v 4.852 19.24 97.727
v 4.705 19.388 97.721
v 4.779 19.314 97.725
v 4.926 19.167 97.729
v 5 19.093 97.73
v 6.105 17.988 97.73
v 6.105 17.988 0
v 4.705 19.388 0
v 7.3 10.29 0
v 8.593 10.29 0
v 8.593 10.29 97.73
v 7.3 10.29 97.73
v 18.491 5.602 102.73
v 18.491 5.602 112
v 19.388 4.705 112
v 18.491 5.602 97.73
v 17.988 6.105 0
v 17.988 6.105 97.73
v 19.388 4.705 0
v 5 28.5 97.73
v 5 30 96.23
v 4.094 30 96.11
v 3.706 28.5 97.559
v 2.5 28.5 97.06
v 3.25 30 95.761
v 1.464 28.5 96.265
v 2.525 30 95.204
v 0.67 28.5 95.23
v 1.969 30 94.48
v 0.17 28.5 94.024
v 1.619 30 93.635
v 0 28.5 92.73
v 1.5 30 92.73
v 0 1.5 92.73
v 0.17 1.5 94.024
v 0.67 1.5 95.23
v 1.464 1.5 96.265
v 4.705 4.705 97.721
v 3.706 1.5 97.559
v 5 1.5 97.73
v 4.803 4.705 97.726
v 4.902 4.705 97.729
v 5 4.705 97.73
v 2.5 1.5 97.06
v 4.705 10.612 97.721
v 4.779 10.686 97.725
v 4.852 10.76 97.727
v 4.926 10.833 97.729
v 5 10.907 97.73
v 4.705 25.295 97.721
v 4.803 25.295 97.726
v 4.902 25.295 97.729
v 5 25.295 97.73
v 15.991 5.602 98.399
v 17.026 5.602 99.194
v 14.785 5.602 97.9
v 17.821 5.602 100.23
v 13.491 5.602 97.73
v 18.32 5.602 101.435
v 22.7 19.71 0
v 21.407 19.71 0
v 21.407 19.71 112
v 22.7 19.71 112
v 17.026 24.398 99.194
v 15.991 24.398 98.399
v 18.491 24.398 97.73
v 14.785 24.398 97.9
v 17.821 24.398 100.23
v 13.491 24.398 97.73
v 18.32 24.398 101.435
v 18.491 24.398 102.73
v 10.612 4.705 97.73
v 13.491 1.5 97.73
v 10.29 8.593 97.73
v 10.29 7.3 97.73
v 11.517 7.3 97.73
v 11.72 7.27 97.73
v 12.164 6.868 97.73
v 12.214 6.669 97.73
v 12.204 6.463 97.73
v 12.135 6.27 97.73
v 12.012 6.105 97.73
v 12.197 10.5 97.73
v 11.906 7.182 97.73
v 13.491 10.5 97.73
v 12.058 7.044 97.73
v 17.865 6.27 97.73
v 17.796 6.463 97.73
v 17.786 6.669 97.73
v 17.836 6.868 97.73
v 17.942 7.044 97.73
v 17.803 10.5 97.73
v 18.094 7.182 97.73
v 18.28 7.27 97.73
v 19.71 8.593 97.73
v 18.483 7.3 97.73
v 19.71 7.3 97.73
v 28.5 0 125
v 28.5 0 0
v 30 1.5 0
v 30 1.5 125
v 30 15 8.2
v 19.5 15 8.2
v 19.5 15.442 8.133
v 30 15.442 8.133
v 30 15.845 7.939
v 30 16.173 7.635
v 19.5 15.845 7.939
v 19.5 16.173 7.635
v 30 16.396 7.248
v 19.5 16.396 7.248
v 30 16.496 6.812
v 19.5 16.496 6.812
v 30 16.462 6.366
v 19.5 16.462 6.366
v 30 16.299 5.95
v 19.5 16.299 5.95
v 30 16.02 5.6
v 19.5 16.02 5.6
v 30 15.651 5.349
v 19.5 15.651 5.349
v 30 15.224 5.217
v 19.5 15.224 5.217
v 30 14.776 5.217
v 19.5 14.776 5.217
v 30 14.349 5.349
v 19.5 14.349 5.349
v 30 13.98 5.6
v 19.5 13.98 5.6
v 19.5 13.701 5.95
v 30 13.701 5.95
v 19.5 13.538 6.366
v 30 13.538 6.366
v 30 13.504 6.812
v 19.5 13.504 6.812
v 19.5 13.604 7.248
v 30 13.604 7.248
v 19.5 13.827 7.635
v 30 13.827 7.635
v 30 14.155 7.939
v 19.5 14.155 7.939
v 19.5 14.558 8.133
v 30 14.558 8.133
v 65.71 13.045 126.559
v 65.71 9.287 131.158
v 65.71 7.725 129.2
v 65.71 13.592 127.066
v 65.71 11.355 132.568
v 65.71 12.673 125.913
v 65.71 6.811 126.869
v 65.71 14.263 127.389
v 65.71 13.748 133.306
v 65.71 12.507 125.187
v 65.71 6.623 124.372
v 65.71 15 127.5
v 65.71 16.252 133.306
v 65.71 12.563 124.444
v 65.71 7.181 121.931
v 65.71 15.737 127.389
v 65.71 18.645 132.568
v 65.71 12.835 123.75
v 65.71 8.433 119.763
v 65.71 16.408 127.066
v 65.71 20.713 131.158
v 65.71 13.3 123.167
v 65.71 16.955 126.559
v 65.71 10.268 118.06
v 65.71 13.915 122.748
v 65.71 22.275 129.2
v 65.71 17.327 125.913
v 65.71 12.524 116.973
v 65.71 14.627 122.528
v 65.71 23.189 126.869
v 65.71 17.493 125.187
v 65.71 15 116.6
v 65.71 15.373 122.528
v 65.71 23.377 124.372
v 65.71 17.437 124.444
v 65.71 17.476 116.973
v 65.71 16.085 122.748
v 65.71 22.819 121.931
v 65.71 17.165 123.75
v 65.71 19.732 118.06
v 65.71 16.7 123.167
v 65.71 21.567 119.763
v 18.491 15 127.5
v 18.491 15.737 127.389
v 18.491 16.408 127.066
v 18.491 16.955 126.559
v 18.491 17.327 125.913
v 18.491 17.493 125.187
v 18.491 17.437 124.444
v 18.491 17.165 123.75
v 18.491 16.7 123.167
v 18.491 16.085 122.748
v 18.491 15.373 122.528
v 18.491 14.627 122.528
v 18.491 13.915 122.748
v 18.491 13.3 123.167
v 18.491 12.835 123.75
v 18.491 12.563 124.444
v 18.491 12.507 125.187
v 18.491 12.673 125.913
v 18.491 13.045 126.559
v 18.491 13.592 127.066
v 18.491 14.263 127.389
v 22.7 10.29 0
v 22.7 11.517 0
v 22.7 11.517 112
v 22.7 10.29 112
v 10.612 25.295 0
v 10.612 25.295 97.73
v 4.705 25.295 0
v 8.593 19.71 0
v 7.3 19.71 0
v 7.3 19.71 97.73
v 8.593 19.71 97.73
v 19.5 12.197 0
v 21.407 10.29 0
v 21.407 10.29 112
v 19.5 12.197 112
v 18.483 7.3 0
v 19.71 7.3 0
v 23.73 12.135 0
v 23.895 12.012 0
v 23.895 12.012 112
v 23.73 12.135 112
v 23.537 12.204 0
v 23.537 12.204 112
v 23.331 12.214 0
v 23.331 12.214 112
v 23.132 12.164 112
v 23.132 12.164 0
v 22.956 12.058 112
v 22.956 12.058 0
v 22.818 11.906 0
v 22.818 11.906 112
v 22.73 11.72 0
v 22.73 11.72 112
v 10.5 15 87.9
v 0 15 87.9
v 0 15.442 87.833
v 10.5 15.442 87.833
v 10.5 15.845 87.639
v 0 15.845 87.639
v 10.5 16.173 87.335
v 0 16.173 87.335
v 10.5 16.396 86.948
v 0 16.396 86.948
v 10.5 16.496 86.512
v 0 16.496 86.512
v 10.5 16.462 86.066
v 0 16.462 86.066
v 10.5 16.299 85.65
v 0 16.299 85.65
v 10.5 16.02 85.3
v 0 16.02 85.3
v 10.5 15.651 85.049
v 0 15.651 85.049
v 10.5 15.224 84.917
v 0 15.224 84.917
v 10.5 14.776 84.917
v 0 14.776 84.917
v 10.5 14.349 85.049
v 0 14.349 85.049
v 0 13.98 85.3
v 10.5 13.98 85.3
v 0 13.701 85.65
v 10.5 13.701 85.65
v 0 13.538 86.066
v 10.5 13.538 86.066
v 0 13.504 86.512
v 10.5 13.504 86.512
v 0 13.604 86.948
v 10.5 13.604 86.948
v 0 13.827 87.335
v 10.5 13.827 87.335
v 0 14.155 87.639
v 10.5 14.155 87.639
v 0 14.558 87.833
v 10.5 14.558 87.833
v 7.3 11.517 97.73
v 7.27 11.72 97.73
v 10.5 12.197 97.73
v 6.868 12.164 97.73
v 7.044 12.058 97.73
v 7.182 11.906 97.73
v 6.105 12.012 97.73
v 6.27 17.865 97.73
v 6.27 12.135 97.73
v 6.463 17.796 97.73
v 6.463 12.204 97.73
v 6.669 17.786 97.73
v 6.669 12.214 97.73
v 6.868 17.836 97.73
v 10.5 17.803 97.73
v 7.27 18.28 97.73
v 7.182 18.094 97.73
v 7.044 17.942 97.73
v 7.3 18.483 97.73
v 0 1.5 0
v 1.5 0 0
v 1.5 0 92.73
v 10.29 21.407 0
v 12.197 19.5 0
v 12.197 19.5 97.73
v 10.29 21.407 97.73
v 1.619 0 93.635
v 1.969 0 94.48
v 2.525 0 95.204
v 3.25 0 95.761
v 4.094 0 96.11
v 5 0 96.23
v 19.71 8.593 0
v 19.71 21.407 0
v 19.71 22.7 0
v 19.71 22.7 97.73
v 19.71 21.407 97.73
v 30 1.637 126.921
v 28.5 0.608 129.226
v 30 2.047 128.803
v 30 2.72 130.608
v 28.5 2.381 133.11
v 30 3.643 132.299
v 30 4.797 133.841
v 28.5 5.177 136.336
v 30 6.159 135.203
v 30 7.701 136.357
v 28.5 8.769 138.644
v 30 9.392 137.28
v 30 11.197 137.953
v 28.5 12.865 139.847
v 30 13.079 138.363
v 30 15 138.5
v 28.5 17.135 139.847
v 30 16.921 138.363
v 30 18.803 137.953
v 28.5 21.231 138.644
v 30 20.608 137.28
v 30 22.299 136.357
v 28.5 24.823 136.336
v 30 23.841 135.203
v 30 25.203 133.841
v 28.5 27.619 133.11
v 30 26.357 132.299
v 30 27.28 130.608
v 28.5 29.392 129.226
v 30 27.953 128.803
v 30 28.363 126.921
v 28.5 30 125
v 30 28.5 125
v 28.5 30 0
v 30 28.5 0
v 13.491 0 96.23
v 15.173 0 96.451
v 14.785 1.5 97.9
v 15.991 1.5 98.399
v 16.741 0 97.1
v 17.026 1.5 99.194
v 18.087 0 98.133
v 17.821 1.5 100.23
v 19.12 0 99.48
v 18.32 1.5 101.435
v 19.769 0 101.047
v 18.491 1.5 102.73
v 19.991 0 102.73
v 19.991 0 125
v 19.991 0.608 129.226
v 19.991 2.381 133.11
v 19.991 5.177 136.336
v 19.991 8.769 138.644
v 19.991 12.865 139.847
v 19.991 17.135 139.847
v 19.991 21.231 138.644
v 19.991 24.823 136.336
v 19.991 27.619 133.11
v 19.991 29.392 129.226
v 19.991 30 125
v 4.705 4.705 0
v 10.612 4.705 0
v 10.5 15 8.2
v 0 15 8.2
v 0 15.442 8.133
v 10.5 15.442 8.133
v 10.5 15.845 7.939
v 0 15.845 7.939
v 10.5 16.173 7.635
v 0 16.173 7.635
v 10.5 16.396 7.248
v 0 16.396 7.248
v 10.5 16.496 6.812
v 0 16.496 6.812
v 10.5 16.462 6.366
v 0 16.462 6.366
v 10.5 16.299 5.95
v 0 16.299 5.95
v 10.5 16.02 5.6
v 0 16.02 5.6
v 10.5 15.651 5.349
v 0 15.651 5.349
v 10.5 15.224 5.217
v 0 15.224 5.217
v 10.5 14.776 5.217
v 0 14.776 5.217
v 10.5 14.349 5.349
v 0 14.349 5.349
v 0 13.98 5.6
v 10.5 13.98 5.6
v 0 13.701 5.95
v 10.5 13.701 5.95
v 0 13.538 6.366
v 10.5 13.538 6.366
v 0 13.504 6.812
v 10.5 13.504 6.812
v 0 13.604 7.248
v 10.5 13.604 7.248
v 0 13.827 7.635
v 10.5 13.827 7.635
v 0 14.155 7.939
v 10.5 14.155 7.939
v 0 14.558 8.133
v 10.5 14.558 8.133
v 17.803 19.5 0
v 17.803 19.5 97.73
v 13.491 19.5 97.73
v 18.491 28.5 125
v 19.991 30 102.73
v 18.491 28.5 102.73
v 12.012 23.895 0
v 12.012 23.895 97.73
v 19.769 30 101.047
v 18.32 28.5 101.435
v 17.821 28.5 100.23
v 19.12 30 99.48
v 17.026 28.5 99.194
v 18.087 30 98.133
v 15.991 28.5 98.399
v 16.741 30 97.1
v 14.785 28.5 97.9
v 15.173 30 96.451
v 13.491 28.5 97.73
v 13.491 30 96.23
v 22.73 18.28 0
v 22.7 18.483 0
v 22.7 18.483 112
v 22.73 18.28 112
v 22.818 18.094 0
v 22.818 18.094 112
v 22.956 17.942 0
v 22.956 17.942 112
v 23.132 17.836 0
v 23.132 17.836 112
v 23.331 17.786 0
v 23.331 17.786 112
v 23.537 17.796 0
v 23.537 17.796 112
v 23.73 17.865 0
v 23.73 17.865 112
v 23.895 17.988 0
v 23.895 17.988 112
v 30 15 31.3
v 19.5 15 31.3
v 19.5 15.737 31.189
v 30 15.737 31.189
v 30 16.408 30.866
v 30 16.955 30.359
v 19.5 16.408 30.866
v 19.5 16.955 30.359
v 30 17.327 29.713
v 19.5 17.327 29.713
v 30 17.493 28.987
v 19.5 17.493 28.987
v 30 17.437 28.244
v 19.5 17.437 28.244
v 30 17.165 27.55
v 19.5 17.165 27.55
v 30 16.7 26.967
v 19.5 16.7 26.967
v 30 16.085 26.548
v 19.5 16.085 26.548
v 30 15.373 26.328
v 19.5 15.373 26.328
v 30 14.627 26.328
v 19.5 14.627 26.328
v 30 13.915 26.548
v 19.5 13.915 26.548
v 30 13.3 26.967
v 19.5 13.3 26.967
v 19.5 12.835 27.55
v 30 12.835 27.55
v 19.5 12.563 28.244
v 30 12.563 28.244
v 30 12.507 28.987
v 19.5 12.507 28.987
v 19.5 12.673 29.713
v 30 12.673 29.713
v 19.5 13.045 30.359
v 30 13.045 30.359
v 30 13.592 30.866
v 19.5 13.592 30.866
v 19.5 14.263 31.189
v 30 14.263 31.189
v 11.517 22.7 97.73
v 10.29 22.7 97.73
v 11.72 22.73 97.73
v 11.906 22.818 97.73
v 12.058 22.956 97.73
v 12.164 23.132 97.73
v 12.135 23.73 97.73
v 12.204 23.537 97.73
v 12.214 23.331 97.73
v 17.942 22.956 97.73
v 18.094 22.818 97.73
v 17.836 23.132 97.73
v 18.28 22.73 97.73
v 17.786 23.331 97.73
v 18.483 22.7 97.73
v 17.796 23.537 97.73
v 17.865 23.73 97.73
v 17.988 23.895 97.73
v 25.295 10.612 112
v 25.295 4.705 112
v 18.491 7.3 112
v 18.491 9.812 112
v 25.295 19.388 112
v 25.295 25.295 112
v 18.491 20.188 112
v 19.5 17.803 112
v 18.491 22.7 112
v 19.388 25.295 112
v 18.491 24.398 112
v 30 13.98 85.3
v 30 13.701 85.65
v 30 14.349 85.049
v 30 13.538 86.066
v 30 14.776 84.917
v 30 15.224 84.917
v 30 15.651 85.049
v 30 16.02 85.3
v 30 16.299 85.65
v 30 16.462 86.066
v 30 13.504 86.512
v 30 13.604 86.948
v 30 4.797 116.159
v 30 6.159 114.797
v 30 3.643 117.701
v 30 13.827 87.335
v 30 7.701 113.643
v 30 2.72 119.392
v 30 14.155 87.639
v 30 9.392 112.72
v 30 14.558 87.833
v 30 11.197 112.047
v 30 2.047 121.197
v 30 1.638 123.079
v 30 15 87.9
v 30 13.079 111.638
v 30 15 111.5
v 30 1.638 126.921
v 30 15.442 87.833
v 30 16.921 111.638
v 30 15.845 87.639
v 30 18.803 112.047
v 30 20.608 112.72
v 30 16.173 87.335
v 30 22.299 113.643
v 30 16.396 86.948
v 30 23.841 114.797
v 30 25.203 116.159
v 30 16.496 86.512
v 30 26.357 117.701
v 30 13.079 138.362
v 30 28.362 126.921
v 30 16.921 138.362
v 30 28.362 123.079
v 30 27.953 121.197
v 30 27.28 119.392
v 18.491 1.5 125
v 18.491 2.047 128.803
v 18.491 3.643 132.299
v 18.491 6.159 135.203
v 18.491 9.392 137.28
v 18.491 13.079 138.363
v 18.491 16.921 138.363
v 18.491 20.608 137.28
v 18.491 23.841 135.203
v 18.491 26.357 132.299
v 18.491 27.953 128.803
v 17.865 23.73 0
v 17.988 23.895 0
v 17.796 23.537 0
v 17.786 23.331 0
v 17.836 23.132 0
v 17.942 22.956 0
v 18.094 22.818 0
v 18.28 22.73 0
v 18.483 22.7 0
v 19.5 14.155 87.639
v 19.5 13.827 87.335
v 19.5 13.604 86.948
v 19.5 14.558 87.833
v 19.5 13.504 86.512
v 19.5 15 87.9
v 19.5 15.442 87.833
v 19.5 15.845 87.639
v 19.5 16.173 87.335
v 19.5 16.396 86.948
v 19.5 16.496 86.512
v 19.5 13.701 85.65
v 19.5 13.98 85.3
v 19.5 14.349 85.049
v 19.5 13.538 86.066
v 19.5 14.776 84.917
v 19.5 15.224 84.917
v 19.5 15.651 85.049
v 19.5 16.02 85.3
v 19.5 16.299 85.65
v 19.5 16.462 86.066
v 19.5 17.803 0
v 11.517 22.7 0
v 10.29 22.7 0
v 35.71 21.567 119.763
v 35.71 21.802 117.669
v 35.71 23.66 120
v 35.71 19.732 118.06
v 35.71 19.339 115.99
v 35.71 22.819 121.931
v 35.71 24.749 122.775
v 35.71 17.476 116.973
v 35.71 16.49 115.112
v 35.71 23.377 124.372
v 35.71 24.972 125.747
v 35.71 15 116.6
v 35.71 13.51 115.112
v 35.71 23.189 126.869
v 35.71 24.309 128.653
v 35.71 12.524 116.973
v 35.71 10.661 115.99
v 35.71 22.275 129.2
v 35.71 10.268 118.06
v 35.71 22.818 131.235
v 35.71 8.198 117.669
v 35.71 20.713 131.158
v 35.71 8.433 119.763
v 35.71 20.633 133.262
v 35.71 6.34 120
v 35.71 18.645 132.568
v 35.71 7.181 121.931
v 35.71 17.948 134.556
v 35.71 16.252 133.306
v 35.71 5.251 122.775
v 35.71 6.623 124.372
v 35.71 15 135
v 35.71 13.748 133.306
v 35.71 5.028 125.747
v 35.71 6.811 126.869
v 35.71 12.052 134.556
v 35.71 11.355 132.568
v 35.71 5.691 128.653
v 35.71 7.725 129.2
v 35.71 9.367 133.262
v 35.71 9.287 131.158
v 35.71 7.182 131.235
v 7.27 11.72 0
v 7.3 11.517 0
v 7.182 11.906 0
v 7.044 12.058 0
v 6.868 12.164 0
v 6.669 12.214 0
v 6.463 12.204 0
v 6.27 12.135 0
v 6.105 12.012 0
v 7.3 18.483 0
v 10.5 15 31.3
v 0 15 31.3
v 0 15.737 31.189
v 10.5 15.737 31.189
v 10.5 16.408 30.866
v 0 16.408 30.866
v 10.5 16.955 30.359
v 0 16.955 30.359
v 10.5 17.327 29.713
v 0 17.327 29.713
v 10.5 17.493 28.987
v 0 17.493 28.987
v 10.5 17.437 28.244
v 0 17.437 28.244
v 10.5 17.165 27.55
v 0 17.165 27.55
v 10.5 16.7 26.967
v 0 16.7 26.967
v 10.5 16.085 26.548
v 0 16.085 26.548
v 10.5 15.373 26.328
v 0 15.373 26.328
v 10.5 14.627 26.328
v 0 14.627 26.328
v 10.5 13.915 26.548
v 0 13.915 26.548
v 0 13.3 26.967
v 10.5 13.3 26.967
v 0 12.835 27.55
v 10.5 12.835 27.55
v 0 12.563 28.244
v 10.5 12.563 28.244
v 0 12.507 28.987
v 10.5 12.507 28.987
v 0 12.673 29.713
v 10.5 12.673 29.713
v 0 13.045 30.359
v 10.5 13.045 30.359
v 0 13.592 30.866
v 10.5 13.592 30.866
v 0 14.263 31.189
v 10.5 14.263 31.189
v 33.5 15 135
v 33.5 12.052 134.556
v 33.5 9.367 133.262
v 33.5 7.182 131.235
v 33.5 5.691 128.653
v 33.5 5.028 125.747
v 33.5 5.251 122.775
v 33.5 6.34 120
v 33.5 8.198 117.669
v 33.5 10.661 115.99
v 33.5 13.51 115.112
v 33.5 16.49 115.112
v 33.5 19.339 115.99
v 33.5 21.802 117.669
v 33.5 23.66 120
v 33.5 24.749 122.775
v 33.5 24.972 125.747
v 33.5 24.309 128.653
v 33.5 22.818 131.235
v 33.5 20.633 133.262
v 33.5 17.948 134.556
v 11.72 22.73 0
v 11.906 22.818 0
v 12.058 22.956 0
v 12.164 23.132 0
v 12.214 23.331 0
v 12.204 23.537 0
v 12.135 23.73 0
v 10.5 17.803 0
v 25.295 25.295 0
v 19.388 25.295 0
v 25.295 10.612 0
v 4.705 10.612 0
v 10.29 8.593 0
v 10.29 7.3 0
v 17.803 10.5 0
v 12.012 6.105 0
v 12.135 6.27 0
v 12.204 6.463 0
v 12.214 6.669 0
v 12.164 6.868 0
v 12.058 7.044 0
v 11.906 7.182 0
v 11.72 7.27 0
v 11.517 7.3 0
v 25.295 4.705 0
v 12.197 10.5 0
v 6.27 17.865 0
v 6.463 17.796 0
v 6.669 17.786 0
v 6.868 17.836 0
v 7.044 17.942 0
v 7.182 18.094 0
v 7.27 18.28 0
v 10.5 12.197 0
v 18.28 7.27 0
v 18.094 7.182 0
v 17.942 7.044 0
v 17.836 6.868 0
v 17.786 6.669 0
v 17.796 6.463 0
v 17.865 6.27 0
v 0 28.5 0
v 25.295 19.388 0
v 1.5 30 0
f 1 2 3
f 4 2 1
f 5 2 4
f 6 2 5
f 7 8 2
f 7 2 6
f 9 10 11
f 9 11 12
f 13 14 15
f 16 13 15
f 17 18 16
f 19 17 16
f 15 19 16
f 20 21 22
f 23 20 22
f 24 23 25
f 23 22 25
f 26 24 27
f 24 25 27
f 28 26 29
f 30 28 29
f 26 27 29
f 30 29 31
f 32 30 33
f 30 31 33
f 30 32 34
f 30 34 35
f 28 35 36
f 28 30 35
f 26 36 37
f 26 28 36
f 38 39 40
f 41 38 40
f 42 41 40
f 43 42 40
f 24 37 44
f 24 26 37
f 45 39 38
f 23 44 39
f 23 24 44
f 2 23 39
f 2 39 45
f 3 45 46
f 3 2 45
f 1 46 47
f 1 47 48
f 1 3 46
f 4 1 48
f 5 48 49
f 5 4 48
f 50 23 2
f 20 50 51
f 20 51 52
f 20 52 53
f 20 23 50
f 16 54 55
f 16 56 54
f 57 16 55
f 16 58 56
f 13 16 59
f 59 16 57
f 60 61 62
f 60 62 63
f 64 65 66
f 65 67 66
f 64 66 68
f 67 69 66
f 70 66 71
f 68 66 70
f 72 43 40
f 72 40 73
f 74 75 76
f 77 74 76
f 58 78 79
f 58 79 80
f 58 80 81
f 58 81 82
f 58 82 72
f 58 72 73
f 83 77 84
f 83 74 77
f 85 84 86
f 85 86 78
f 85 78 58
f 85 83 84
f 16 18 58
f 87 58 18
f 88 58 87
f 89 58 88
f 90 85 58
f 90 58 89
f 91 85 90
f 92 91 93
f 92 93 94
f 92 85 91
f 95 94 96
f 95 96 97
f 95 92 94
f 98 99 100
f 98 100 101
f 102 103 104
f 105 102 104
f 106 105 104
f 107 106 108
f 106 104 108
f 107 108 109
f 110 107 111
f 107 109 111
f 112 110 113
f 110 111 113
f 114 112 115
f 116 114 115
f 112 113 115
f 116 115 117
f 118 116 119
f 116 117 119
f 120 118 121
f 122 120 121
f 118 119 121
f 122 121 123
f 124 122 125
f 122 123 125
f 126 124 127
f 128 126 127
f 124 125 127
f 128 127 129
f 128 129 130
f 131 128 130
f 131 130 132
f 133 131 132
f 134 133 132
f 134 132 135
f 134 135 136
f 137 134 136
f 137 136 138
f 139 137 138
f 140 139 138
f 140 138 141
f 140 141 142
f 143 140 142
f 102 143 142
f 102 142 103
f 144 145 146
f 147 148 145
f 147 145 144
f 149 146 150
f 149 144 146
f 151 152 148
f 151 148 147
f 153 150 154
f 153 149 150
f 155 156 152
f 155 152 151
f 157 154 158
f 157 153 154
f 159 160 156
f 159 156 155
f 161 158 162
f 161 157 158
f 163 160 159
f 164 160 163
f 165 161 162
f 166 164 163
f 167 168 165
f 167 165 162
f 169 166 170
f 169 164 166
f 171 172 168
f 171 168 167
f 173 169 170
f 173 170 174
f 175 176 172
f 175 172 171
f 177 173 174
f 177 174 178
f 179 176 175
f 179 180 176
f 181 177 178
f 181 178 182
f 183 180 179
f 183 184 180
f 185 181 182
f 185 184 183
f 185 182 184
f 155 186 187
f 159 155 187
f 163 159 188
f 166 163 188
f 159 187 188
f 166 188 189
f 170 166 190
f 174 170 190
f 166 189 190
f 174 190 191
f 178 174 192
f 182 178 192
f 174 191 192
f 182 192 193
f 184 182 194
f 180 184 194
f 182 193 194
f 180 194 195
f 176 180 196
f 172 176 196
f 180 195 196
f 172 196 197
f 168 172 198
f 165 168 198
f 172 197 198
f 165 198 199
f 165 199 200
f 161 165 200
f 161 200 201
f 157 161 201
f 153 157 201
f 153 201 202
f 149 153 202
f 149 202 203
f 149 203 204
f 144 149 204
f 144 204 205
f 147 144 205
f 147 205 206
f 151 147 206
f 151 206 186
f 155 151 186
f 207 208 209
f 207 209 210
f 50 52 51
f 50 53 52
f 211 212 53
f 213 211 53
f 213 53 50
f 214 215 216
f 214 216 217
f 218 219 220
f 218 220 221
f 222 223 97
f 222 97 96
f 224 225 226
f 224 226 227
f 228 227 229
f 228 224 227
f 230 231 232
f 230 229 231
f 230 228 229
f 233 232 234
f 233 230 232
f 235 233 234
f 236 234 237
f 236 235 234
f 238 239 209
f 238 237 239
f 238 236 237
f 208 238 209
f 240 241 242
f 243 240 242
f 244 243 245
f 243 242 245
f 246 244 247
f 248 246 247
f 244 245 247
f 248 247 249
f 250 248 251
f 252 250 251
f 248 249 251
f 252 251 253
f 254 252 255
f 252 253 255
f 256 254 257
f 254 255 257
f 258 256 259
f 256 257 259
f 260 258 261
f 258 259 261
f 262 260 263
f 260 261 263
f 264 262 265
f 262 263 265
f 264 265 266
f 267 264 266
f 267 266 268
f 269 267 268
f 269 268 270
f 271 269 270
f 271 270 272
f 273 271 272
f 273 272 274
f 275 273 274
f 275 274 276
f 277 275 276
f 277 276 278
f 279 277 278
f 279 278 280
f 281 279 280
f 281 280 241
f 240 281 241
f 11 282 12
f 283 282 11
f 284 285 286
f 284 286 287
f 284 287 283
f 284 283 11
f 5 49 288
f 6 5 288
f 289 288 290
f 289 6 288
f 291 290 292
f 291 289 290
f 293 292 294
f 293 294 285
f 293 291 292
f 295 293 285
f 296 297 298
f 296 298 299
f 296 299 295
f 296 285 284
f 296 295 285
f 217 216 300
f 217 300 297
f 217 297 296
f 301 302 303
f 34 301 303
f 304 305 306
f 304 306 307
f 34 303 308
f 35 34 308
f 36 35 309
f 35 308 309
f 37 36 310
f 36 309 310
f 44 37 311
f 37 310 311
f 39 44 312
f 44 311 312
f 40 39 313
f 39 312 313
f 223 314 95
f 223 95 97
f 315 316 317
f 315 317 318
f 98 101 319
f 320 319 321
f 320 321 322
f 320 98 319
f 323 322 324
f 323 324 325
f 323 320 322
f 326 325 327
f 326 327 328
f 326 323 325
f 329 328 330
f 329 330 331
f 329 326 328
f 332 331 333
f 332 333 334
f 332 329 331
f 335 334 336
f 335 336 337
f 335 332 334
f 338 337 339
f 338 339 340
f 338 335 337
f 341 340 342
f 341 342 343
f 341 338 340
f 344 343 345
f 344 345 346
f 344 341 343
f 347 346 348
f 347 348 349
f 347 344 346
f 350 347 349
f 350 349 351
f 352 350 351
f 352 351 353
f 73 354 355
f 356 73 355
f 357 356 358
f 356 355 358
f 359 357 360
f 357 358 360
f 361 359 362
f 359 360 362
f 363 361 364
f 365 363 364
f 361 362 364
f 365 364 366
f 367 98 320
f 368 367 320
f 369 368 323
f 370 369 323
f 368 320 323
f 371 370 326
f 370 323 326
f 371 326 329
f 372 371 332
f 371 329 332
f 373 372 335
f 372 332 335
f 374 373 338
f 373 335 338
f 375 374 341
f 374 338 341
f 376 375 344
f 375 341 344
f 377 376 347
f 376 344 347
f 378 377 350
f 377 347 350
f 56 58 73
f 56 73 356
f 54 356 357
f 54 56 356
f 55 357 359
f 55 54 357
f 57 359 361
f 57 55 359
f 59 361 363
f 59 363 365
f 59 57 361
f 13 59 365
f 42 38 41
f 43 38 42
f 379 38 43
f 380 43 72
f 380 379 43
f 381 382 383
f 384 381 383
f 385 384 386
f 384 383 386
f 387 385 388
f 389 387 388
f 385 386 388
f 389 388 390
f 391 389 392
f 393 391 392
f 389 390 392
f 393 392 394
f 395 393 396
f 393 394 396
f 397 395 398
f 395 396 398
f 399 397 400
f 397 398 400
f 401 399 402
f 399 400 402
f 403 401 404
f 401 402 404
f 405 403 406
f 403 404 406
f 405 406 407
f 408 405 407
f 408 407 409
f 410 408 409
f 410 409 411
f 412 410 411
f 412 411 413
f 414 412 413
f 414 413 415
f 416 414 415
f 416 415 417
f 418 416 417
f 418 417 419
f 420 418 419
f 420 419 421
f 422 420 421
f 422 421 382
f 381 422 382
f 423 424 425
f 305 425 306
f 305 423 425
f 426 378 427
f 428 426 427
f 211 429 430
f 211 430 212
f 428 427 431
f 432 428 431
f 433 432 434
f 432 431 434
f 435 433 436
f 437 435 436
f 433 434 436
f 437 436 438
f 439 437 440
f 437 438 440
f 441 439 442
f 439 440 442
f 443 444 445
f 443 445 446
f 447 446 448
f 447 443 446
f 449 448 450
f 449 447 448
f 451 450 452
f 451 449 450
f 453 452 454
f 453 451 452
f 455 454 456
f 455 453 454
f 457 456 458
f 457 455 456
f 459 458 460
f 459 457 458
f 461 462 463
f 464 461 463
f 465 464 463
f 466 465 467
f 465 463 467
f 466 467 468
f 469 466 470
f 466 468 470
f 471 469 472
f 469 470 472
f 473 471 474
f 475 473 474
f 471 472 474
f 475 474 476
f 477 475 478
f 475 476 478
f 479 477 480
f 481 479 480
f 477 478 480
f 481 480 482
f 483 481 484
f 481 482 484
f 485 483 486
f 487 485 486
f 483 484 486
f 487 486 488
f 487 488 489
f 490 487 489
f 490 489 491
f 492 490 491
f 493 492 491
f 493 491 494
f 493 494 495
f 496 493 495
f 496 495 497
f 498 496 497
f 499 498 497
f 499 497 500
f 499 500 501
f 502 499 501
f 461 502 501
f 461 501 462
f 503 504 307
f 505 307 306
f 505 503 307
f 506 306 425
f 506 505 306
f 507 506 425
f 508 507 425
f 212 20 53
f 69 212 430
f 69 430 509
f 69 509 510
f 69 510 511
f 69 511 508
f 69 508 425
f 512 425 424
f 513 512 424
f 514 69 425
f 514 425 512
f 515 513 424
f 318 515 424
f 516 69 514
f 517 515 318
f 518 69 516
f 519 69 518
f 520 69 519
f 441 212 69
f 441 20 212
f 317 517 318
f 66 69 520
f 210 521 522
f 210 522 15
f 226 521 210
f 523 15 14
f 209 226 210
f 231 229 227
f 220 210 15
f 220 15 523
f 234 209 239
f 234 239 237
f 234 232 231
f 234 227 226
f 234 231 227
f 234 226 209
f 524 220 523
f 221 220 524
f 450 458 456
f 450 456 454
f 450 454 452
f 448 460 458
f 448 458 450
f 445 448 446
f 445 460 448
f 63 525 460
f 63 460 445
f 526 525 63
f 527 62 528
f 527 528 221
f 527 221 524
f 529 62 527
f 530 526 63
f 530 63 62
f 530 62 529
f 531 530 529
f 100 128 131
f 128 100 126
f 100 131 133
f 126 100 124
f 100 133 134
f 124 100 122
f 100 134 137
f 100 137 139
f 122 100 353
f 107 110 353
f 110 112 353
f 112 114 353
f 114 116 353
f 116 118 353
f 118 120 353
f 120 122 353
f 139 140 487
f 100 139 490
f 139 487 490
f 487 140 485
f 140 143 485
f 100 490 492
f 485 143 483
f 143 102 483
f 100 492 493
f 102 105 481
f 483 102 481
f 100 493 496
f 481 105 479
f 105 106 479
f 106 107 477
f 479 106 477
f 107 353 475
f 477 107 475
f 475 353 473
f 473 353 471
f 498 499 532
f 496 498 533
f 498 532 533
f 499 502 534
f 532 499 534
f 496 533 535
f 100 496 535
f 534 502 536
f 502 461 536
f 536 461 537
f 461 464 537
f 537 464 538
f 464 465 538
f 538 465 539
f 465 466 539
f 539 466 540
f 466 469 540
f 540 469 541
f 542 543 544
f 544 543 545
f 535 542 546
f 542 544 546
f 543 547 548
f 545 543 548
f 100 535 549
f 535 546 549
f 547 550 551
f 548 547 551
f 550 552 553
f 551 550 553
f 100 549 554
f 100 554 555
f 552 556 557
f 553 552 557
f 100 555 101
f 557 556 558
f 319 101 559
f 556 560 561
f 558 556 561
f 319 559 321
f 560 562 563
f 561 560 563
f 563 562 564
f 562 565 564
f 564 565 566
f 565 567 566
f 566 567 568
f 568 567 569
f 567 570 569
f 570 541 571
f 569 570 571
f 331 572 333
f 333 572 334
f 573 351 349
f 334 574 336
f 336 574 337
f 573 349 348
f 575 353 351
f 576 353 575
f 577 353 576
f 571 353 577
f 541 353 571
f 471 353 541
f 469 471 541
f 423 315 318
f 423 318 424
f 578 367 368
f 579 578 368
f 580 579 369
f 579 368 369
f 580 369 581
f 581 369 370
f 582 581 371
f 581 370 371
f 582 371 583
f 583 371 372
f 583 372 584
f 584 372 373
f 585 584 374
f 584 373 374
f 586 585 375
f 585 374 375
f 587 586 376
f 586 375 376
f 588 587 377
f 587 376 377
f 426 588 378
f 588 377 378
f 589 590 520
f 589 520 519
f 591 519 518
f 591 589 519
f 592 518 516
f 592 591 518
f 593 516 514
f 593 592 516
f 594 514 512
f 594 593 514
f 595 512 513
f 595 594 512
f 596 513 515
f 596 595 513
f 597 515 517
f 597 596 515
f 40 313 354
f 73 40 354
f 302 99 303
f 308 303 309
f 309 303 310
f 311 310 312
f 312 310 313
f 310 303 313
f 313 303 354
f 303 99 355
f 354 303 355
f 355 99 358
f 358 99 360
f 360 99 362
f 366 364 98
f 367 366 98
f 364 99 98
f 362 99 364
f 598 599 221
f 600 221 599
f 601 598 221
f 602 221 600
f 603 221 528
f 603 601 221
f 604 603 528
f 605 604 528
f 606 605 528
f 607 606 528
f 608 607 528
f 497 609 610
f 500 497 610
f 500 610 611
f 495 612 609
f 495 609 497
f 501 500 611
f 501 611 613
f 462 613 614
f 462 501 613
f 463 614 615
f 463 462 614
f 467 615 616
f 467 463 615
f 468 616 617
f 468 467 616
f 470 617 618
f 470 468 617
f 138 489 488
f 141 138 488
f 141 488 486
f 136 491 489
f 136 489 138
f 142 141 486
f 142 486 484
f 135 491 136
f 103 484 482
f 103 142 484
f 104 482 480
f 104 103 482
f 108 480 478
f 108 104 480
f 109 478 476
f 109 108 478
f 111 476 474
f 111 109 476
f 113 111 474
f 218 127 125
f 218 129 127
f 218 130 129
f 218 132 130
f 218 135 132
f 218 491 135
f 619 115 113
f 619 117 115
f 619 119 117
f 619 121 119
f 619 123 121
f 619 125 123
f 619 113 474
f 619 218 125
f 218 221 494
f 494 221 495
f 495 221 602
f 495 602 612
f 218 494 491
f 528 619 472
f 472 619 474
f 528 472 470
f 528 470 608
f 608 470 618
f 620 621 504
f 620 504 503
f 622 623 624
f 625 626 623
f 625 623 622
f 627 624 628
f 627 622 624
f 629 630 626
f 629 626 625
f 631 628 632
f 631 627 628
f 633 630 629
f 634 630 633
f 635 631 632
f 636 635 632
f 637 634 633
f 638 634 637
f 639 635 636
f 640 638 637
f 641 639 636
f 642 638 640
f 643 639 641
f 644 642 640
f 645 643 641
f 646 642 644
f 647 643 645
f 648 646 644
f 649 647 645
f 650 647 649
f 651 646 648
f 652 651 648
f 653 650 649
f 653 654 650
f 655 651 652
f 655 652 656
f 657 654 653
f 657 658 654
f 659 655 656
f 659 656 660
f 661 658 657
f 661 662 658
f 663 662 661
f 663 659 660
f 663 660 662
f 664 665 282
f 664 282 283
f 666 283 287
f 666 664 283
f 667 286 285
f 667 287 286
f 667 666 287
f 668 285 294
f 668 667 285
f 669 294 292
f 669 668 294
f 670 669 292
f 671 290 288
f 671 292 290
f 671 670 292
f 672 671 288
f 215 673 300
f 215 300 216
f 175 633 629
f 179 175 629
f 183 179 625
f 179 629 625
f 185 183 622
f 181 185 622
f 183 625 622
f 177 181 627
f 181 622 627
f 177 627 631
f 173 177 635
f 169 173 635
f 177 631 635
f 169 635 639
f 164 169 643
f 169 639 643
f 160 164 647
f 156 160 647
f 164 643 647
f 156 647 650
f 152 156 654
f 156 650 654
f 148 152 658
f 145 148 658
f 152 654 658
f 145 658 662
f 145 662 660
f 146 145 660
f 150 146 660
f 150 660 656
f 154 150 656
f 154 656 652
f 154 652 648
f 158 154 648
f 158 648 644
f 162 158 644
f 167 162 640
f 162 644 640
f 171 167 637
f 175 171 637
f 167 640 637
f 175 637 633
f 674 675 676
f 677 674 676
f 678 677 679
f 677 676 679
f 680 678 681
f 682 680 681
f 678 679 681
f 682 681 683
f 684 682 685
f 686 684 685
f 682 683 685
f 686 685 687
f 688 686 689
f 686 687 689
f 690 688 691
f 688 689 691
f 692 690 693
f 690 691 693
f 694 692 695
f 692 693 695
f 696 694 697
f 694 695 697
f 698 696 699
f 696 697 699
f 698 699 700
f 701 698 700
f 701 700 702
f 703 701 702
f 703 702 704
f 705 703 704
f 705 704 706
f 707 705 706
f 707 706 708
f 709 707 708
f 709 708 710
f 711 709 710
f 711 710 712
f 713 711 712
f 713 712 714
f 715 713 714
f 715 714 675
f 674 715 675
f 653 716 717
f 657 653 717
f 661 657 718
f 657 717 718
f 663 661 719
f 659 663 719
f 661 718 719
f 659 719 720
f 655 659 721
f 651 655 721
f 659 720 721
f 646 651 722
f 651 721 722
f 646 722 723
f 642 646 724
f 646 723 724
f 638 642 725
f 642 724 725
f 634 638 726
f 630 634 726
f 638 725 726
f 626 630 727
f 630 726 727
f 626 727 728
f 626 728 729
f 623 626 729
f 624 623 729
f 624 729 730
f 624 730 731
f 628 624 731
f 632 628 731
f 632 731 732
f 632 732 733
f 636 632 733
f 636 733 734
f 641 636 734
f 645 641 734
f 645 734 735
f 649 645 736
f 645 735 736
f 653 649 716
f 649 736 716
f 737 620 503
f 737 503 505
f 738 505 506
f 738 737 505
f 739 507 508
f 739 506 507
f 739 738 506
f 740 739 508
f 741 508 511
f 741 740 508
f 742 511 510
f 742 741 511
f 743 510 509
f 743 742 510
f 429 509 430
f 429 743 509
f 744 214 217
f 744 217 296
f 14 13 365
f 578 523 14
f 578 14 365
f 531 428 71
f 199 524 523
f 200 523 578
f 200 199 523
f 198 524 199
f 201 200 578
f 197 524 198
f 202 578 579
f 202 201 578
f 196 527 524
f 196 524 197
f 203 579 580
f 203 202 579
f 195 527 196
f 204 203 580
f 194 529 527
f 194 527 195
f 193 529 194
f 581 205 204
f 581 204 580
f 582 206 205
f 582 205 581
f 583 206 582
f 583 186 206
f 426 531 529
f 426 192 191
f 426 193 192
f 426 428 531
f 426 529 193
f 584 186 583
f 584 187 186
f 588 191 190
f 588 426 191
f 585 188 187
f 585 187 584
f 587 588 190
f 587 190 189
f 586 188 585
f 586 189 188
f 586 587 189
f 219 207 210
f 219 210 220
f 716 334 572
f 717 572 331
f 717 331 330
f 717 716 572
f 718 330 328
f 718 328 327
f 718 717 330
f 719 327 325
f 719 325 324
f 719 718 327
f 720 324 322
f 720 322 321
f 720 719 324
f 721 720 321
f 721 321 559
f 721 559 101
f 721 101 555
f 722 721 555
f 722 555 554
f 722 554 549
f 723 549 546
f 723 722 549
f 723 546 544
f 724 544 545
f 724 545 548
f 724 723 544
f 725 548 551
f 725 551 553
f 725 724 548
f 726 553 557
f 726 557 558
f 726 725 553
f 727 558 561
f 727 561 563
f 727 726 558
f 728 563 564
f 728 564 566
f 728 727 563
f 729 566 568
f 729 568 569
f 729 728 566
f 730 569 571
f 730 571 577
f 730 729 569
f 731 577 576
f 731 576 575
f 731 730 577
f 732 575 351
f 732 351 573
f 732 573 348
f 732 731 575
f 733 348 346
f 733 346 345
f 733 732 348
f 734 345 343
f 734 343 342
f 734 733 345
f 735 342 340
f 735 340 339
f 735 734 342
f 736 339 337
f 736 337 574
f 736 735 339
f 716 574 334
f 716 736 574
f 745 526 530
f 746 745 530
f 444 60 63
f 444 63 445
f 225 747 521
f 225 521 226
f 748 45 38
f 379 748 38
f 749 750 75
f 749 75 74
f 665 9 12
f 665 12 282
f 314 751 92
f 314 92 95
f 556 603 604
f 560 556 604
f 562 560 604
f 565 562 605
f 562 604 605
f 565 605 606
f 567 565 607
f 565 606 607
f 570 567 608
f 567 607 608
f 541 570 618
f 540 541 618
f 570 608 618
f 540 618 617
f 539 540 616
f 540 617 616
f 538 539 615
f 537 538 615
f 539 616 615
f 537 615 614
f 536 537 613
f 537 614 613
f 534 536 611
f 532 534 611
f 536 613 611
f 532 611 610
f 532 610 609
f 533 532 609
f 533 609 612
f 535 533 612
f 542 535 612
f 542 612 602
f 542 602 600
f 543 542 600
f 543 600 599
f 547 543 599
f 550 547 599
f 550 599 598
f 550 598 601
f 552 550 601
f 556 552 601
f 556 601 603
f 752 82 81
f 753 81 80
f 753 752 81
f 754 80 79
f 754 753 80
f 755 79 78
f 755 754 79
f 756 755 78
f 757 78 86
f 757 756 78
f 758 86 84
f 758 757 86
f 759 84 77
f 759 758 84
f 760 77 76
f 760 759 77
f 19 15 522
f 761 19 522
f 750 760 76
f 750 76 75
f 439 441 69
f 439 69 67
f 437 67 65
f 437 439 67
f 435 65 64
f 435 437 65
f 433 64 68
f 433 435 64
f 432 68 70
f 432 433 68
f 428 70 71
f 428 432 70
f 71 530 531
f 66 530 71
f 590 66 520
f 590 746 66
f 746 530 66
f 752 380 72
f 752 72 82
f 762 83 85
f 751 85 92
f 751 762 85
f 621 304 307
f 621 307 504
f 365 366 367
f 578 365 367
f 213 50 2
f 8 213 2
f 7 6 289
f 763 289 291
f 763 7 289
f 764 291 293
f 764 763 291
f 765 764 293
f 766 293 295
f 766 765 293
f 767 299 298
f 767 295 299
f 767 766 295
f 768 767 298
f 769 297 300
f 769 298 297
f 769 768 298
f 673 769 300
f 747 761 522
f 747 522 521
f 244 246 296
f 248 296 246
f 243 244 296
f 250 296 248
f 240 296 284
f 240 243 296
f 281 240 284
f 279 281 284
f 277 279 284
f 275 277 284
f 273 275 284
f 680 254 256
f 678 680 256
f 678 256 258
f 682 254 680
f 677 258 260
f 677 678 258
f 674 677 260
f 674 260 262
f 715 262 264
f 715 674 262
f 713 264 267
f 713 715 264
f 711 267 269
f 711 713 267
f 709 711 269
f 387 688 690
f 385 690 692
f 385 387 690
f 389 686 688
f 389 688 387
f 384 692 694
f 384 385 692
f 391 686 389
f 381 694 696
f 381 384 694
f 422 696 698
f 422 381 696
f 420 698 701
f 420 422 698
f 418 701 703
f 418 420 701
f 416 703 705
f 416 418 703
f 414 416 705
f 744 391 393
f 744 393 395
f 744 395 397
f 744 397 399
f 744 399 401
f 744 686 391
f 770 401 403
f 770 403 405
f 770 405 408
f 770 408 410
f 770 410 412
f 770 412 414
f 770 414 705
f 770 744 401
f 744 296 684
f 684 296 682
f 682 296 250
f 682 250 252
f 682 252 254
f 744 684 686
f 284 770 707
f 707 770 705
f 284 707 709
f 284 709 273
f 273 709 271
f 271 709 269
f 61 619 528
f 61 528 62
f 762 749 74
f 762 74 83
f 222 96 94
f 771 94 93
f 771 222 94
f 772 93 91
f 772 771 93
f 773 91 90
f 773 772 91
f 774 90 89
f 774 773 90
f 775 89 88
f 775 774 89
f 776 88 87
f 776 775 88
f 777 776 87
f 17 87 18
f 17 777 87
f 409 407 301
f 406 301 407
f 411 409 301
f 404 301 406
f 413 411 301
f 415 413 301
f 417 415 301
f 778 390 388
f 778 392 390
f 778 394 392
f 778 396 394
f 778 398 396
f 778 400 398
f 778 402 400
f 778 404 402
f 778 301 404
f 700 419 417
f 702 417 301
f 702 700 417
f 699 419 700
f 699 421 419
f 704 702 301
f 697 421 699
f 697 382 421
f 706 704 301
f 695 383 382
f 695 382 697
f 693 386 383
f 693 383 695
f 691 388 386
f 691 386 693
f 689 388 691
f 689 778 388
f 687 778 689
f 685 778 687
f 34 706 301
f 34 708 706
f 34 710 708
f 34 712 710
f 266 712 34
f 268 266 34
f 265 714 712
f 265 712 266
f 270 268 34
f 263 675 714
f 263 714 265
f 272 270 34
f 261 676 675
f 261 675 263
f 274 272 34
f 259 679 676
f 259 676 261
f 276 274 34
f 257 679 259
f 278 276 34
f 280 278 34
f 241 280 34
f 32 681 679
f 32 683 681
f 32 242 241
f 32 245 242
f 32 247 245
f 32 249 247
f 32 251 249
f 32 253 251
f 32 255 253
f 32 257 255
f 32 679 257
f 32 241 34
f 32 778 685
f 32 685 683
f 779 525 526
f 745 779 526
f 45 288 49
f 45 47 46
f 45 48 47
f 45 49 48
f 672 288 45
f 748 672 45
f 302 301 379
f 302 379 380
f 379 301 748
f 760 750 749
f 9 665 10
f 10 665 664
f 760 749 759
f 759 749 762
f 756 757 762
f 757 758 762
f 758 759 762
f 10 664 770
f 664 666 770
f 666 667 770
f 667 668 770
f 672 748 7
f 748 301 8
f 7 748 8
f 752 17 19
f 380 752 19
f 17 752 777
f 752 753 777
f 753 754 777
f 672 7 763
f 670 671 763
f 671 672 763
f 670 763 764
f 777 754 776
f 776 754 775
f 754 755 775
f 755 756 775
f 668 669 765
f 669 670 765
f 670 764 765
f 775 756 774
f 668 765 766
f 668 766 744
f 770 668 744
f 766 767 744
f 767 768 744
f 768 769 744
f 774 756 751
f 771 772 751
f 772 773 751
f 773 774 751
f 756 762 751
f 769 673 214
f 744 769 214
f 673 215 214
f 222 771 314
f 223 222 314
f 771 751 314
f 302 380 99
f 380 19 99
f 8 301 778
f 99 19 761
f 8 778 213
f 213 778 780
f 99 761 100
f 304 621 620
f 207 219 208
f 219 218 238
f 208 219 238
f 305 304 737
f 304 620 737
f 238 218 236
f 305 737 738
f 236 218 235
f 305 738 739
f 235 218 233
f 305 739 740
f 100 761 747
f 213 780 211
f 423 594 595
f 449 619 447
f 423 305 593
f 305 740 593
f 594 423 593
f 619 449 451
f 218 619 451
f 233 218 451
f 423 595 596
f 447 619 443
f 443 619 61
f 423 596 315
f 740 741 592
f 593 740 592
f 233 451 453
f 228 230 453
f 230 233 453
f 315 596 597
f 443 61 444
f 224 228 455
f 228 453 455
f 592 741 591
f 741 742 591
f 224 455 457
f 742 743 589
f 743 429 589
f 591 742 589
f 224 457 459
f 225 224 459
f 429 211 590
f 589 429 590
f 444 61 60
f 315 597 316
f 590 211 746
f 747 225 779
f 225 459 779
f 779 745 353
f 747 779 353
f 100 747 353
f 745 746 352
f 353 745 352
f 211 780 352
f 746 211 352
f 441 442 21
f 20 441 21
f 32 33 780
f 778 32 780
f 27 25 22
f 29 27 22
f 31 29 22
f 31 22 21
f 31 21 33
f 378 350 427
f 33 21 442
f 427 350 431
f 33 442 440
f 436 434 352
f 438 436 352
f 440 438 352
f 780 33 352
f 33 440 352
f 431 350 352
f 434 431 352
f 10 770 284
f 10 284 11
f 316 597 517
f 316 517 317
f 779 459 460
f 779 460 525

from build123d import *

# Parameters (mm, degrees)
SKETCH1_W               = 30
SKETCH1_H               = 30
BOSS_EXTRUDE3_DEPTH     = 95
BOSS_EXTRUDE4_DEPTH     = 30
CUT_EXTRUDE1_DEPTH      = 147.287388383
SKETCH5_R               = 10
BOSS_EXTRUDE5_DEPTH     = 5.71
SKETCH6_R               = 8.4
BOSS_EXTRUDE6_DEPTH     = 30
SKETCH8_R               = 1.5
SKETCH8_R_2             = 2.5
CUT_EXTRUDE2_DEPTH      = 158.536675412
CHAMFER1_SIZE           = 1.5
CHAMFER2_SIZE           = 3.5
CUT_EXTRUDE3_DEPTH      = 17
CUT_EXTRUDE4_DEPTH      = 10
CUT_EXTRUDE4_DEPTH_BACK = 2
SKETCH10_W              = 14.270411079
SKETCH10_H              = 4.897722898


with BuildPart() as part:
    # Sketch1 → Boss-Extrude3 (new body)
    with BuildSketch(Plane.XY):
        with Locations((15, 15)):
            Rectangle(SKETCH1_W, SKETCH1_H)
        with BuildLine():
            Line((17.802943725, 19.5), (12.197056275, 19.5))
            Line((12.197056275, 19.5), (10.289949494, 21.407106781))
            Line((10.289949494, 21.407106781), (10.289949494, 22.7))
            Line((10.289949494, 22.7), (11.517157288, 22.7))
            ThreePointArc((11.517157288, 22.7), (12.16387296, 23.132121597), (12.012132034, 23.894974747))
            Line((12.012132034, 23.894974747), (10.612132034, 25.294974747))
            Line((10.612132034, 25.294974747), (4.705025253, 25.294974747))
            Line((4.705025253, 25.294974747), (4.705025253, 19.387867966))
            Line((4.705025253, 19.387867966), (6.105025253, 17.987867966))
            ThreePointArc((6.105025253, 17.987867966), (6.867878403, 17.83612704), (7.3, 18.482842712))
            Line((7.3, 18.482842712), (7.3, 19.710050506))
            Line((7.3, 19.710050506), (8.592893219, 19.710050506))
            Line((8.592893219, 19.710050506), (10.5, 17.802943725))
            Line((10.5, 17.802943725), (10.5, 12.197056275))
            Line((10.5, 12.197056275), (8.592893219, 10.289949494))
            Line((8.592893219, 10.289949494), (7.3, 10.289949494))
            Line((7.3, 10.289949494), (7.3, 11.517157288))
            ThreePointArc((7.3, 11.517157288), (6.867878403, 12.16387296), (6.105025253, 12.012132034))
            Line((6.105025253, 12.012132034), (4.705025253, 10.612132034))
            Line((4.705025253, 10.612132034), (4.705025253, 4.705025253))
            Line((4.705025253, 4.705025253), (10.612132034, 4.705025253))
            Line((10.612132034, 4.705025253), (12.012132034, 6.105025253))
            ThreePointArc((12.012132034, 6.105025253), (12.16387296, 6.867878403), (11.517157288, 7.3))
            Line((11.517157288, 7.3), (10.289949494, 7.3))
            Line((10.289949494, 7.3), (10.289949494, 8.592893219))
            Line((10.289949494, 8.592893219), (12.197056275, 10.5))
            Line((12.197056275, 10.5), (17.802943725, 10.5))
            Line((17.802943725, 10.5), (19.710050506, 8.592893219))
            Line((19.710050506, 8.592893219), (19.710050506, 7.3))
            Line((19.710050506, 7.3), (18.482842712, 7.3))
            ThreePointArc((18.482842712, 7.3), (17.83612704, 6.867878403), (17.987867966, 6.105025253))
            Line((17.987867966, 6.105025253), (19.387867966, 4.705025253))
            Line((19.387867966, 4.705025253), (25.294974747, 4.705025253))
            Line((25.294974747, 4.705025253), (25.294974747, 10.612132034))
            Line((25.294974747, 10.612132034), (23.894974747, 12.012132034))
            ThreePointArc((23.894974747, 12.012132034), (23.132121597, 12.16387296), (22.7, 11.517157288))
            Line((22.7, 11.517157288), (22.7, 10.289949494))
            Line((22.7, 10.289949494), (21.407106781, 10.289949494))
            Line((21.407106781, 10.289949494), (19.5, 12.197056275))
            Line((19.5, 12.197056275), (19.5, 17.802943725))
            Line((19.5, 17.802943725), (21.407106781, 19.710050506))
            Line((21.407106781, 19.710050506), (22.7, 19.710050506))
            Line((22.7, 19.710050506), (22.7, 18.482842712))
            ThreePointArc((22.7, 18.482842712), (23.132121597, 17.83612704), (23.894974747, 17.987867966))
            Line((23.894974747, 17.987867966), (25.294974747, 19.387867966))
            Line((25.294974747, 19.387867966), (25.294974747, 25.294974747))
            Line((25.294974747, 25.294974747), (19.387867966, 25.294974747))
            Line((19.387867966, 25.294974747), (17.987867966, 23.894974747))
            ThreePointArc((17.987867966, 23.894974747), (17.83612704, 23.132121597), (18.482842712, 22.7))
            Line((18.482842712, 22.7), (19.710050506, 22.7))
            Line((19.710050506, 22.7), (19.710050506, 21.407106781))
            Line((19.710050506, 21.407106781), (17.802943725, 19.5))
        make_face(mode=Mode.SUBTRACT)
    extrude(amount=BOSS_EXTRUDE3_DEPTH)

    # Sketch3 → Boss-Extrude4 (add)
    with BuildSketch(Plane(origin=(30, 0, 0), x_dir=(0, 0, -1), z_dir=(1, 0, 0))):
        with BuildLine():
            Line((-125, 30), (-95, 30))
            Line((-95, 30), (-95, 0))
            Line((-95, 0), (-125, 0))
            ThreePointArc((-125, 0), (-140, 15), (-125, 30))
        make_face()
    extrude(amount=-BOSS_EXTRUDE4_DEPTH)

    # Sketch4 → Cut-Extrude1 (cut, through all)
    with BuildSketch(Plane(origin=(0, 30, 0), x_dir=(1, 0, 0), z_dir=(0, 1, 0))):
        with BuildLine():
            Line((5, -97.729588921), (13.490616116, -97.729588921))
            ThreePointArc((13.490616116, -97.729588921), (17.026150022, -99.194055015), (18.490616116, -102.729588921))
            Line((18.490616116, -102.729588921), (18.490616116, -140))
            Line((18.490616116, -140), (0, -140))
            Line((0, -140), (0, -92.729588921))
            ThreePointArc((0, -92.729588921), (1.464466094, -96.265122827), (5, -97.729588921))
        make_face()
    extrude(amount=-CUT_EXTRUDE1_DEPTH, mode=Mode.SUBTRACT)

    # Sketch5 → Boss-Extrude5 (add)
    with BuildSketch(Plane(origin=(30, 0, 0), x_dir=(0, 0, -1), z_dir=(1, 0, 0))):
        with Locations(Location((-125, 15, 0), (0, 0, 180))):
            Circle(SKETCH5_R)
    extrude(amount=BOSS_EXTRUDE5_DEPTH)

    # Sketch6 → Boss-Extrude6 (add)
    with BuildSketch(Plane(origin=(35.71, 0, 0), x_dir=(0, 0, -1), z_dir=(1, 0, 0))):
        with Locations((-125, 15)):
            Circle(SKETCH6_R)
    extrude(amount=BOSS_EXTRUDE6_DEPTH)

    # Sketch8 → Cut-Extrude2 (cut, through all)
    with BuildSketch(Plane.ZY):
        with Locations((6.7, 15)):
            Circle(SKETCH8_R)
        with Locations((86.4, 15)):
            Circle(SKETCH8_R)
        with Locations((28.8, 15)):
            Circle(SKETCH8_R_2)
        with Locations((125, 15)):
            Circle(SKETCH8_R_2)
    extrude(amount=-CUT_EXTRUDE2_DEPTH, mode=Mode.SUBTRACT)

    # Chamfer1
    chamfer1_edges = [part.edges().sort_by_distance(p)[0] for p in [
        (30, 15, 140),
        (18.490616116, 15, 140),
        (0, 30, 46.364794461),
        (0, 0, 46.364794461),
        (18.490616116, 30, 113.864794461),
        (17.026150022, 30, 99.194055015),
        (9.245308058, 30, 97.729588921),
        (1.464466094, 30, 96.265122827),
        (18.490616116, 0, 113.864794461),
        (1.464466094, 0, 96.265122827),
        (9.245308058, 0, 97.729588921),
        (17.026150022, 0, 99.194055015),
        (30, 30, 62.5),
        (30, 0, 62.5),
    ]]
    chamfer(chamfer1_edges, length=CHAMFER1_SIZE)

    # Chamfer2
    chamfer2_edges = [part.edges().sort_by_distance(p)[0] for p in [
        (30, 15, 115),
    ]]
    chamfer(chamfer2_edges, length=CHAMFER2_SIZE - 0.0001)  # a hair under: the kernel refuses the full size

    # Sketch9 → Cut-Extrude3 (cut)
    with BuildSketch(Plane(origin=(0, 0, 95), x_dir=(-1, 0, 0), z_dir=(0, 0, -1))):
        with BuildLine():
            Line((-10.612132034, 4.705025253), (-4.705025253, 4.705025253))
            Line((-4.705025253, 4.705025253), (-4.705025253, 10.612132034))
            Line((-4.705025253, 10.612132034), (-6.105025253, 12.012132034))
            ThreePointArc((-6.105025253, 12.012132034), (-6.867878403, 12.16387296), (-7.3, 11.517157288))
            Line((-7.3, 11.517157288), (-7.3, 10.289949494))
            Line((-7.3, 10.289949494), (-8.592893219, 10.289949494))
            Line((-8.592893219, 10.289949494), (-10.5, 12.197056275))
            Line((-10.5, 12.197056275), (-10.5, 17.802943725))
            Line((-10.5, 17.802943725), (-8.592893219, 19.710050506))
            Line((-8.592893219, 19.710050506), (-7.3, 19.710050506))
            Line((-7.3, 19.710050506), (-7.3, 18.482842712))
            ThreePointArc((-7.3, 18.482842712), (-6.867878403, 17.83612704), (-6.105025253, 17.987867966))
            Line((-6.105025253, 17.987867966), (-4.705025253, 19.387867966))
            Line((-4.705025253, 19.387867966), (-4.705025253, 25.294974747))
            Line((-4.705025253, 25.294974747), (-10.612132034, 25.294974747))
            Line((-10.612132034, 25.294974747), (-12.012132034, 23.894974747))
            ThreePointArc((-12.012132034, 23.894974747), (-12.16387296, 23.132121597), (-11.517157288, 22.7))
            Line((-11.517157288, 22.7), (-10.289949494, 22.7))
            Line((-10.289949494, 22.7), (-10.289949494, 21.407106781))
            Line((-10.289949494, 21.407106781), (-12.197056275, 19.5))
            Line((-12.197056275, 19.5), (-17.802943725, 19.5))
            Line((-17.802943725, 19.5), (-19.710050506, 21.407106781))
            Line((-19.710050506, 21.407106781), (-19.710050506, 22.7))
            Line((-19.710050506, 22.7), (-18.482842712, 22.7))
            ThreePointArc((-18.482842712, 22.7), (-17.83612704, 23.132121597), (-17.987867966, 23.894974747))
            Line((-17.987867966, 23.894974747), (-19.387867966, 25.294974747))
            Line((-19.387867966, 25.294974747), (-25.294974747, 25.294974747))
            Line((-25.294974747, 25.294974747), (-25.294974747, 19.387867966))
            Line((-25.294974747, 19.387867966), (-23.894974747, 17.987867966))
            ThreePointArc((-23.894974747, 17.987867966), (-23.132121597, 17.83612704), (-22.7, 18.482842712))
            Line((-22.7, 18.482842712), (-22.7, 19.710050506))
            Line((-22.7, 19.710050506), (-21.407106781, 19.710050506))
            Line((-21.407106781, 19.710050506), (-19.5, 17.802943725))
            Line((-19.5, 17.802943725), (-19.5, 12.197056275))
            Line((-19.5, 12.197056275), (-21.407106781, 10.289949494))
            Line((-21.407106781, 10.289949494), (-22.7, 10.289949494))
            Line((-22.7, 10.289949494), (-22.7, 11.517157288))
            ThreePointArc((-22.7, 11.517157288), (-23.132121597, 12.16387296), (-23.894974747, 12.012132034))
            Line((-23.894974747, 12.012132034), (-25.294974747, 10.612132034))
            Line((-25.294974747, 10.612132034), (-25.294974747, 4.705025253))
            Line((-25.294974747, 4.705025253), (-19.387867966, 4.705025253))
            Line((-19.387867966, 4.705025253), (-17.987867966, 6.105025253))
            ThreePointArc((-17.987867966, 6.105025253), (-17.83612704, 6.867878403), (-18.482842712, 7.3))
            Line((-18.482842712, 7.3), (-19.710050506, 7.3))
            Line((-19.710050506, 7.3), (-19.710050506, 8.592893219))
            Line((-19.710050506, 8.592893219), (-17.802943725, 10.5))
            Line((-17.802943725, 10.5), (-12.197056275, 10.5))
            Line((-12.197056275, 10.5), (-10.289949494, 8.592893219))
            Line((-10.289949494, 8.592893219), (-10.289949494, 7.3))
            Line((-10.289949494, 7.3), (-11.517157288, 7.3))
            ThreePointArc((-11.517157288, 7.3), (-12.16387296, 6.867878403), (-12.012132034, 6.105025253))
            Line((-12.012132034, 6.105025253), (-10.612132034, 4.705025253))
        make_face()
    extrude(amount=-CUT_EXTRUDE3_DEPTH, mode=Mode.SUBTRACT)

    # Sketch10 → Cut-Extrude4 (cut, two sides: drawn at the far end of the back side and taken through both)
    with BuildSketch(Plane.ZY.offset(-18.490616116).offset(-CUT_EXTRUDE4_DEPTH_BACK)):
        with Locations((104.864794461, 21.948861449)):
            Rectangle(SKETCH10_W, SKETCH10_H)
        with Locations((104.864794461, 8.051138551)):
            Rectangle(SKETCH10_W, SKETCH10_H)
    extrude(amount=CUT_EXTRUDE4_DEPTH + CUT_EXTRUDE4_DEPTH_BACK, mode=Mode.SUBTRACT)


solid = part.part
